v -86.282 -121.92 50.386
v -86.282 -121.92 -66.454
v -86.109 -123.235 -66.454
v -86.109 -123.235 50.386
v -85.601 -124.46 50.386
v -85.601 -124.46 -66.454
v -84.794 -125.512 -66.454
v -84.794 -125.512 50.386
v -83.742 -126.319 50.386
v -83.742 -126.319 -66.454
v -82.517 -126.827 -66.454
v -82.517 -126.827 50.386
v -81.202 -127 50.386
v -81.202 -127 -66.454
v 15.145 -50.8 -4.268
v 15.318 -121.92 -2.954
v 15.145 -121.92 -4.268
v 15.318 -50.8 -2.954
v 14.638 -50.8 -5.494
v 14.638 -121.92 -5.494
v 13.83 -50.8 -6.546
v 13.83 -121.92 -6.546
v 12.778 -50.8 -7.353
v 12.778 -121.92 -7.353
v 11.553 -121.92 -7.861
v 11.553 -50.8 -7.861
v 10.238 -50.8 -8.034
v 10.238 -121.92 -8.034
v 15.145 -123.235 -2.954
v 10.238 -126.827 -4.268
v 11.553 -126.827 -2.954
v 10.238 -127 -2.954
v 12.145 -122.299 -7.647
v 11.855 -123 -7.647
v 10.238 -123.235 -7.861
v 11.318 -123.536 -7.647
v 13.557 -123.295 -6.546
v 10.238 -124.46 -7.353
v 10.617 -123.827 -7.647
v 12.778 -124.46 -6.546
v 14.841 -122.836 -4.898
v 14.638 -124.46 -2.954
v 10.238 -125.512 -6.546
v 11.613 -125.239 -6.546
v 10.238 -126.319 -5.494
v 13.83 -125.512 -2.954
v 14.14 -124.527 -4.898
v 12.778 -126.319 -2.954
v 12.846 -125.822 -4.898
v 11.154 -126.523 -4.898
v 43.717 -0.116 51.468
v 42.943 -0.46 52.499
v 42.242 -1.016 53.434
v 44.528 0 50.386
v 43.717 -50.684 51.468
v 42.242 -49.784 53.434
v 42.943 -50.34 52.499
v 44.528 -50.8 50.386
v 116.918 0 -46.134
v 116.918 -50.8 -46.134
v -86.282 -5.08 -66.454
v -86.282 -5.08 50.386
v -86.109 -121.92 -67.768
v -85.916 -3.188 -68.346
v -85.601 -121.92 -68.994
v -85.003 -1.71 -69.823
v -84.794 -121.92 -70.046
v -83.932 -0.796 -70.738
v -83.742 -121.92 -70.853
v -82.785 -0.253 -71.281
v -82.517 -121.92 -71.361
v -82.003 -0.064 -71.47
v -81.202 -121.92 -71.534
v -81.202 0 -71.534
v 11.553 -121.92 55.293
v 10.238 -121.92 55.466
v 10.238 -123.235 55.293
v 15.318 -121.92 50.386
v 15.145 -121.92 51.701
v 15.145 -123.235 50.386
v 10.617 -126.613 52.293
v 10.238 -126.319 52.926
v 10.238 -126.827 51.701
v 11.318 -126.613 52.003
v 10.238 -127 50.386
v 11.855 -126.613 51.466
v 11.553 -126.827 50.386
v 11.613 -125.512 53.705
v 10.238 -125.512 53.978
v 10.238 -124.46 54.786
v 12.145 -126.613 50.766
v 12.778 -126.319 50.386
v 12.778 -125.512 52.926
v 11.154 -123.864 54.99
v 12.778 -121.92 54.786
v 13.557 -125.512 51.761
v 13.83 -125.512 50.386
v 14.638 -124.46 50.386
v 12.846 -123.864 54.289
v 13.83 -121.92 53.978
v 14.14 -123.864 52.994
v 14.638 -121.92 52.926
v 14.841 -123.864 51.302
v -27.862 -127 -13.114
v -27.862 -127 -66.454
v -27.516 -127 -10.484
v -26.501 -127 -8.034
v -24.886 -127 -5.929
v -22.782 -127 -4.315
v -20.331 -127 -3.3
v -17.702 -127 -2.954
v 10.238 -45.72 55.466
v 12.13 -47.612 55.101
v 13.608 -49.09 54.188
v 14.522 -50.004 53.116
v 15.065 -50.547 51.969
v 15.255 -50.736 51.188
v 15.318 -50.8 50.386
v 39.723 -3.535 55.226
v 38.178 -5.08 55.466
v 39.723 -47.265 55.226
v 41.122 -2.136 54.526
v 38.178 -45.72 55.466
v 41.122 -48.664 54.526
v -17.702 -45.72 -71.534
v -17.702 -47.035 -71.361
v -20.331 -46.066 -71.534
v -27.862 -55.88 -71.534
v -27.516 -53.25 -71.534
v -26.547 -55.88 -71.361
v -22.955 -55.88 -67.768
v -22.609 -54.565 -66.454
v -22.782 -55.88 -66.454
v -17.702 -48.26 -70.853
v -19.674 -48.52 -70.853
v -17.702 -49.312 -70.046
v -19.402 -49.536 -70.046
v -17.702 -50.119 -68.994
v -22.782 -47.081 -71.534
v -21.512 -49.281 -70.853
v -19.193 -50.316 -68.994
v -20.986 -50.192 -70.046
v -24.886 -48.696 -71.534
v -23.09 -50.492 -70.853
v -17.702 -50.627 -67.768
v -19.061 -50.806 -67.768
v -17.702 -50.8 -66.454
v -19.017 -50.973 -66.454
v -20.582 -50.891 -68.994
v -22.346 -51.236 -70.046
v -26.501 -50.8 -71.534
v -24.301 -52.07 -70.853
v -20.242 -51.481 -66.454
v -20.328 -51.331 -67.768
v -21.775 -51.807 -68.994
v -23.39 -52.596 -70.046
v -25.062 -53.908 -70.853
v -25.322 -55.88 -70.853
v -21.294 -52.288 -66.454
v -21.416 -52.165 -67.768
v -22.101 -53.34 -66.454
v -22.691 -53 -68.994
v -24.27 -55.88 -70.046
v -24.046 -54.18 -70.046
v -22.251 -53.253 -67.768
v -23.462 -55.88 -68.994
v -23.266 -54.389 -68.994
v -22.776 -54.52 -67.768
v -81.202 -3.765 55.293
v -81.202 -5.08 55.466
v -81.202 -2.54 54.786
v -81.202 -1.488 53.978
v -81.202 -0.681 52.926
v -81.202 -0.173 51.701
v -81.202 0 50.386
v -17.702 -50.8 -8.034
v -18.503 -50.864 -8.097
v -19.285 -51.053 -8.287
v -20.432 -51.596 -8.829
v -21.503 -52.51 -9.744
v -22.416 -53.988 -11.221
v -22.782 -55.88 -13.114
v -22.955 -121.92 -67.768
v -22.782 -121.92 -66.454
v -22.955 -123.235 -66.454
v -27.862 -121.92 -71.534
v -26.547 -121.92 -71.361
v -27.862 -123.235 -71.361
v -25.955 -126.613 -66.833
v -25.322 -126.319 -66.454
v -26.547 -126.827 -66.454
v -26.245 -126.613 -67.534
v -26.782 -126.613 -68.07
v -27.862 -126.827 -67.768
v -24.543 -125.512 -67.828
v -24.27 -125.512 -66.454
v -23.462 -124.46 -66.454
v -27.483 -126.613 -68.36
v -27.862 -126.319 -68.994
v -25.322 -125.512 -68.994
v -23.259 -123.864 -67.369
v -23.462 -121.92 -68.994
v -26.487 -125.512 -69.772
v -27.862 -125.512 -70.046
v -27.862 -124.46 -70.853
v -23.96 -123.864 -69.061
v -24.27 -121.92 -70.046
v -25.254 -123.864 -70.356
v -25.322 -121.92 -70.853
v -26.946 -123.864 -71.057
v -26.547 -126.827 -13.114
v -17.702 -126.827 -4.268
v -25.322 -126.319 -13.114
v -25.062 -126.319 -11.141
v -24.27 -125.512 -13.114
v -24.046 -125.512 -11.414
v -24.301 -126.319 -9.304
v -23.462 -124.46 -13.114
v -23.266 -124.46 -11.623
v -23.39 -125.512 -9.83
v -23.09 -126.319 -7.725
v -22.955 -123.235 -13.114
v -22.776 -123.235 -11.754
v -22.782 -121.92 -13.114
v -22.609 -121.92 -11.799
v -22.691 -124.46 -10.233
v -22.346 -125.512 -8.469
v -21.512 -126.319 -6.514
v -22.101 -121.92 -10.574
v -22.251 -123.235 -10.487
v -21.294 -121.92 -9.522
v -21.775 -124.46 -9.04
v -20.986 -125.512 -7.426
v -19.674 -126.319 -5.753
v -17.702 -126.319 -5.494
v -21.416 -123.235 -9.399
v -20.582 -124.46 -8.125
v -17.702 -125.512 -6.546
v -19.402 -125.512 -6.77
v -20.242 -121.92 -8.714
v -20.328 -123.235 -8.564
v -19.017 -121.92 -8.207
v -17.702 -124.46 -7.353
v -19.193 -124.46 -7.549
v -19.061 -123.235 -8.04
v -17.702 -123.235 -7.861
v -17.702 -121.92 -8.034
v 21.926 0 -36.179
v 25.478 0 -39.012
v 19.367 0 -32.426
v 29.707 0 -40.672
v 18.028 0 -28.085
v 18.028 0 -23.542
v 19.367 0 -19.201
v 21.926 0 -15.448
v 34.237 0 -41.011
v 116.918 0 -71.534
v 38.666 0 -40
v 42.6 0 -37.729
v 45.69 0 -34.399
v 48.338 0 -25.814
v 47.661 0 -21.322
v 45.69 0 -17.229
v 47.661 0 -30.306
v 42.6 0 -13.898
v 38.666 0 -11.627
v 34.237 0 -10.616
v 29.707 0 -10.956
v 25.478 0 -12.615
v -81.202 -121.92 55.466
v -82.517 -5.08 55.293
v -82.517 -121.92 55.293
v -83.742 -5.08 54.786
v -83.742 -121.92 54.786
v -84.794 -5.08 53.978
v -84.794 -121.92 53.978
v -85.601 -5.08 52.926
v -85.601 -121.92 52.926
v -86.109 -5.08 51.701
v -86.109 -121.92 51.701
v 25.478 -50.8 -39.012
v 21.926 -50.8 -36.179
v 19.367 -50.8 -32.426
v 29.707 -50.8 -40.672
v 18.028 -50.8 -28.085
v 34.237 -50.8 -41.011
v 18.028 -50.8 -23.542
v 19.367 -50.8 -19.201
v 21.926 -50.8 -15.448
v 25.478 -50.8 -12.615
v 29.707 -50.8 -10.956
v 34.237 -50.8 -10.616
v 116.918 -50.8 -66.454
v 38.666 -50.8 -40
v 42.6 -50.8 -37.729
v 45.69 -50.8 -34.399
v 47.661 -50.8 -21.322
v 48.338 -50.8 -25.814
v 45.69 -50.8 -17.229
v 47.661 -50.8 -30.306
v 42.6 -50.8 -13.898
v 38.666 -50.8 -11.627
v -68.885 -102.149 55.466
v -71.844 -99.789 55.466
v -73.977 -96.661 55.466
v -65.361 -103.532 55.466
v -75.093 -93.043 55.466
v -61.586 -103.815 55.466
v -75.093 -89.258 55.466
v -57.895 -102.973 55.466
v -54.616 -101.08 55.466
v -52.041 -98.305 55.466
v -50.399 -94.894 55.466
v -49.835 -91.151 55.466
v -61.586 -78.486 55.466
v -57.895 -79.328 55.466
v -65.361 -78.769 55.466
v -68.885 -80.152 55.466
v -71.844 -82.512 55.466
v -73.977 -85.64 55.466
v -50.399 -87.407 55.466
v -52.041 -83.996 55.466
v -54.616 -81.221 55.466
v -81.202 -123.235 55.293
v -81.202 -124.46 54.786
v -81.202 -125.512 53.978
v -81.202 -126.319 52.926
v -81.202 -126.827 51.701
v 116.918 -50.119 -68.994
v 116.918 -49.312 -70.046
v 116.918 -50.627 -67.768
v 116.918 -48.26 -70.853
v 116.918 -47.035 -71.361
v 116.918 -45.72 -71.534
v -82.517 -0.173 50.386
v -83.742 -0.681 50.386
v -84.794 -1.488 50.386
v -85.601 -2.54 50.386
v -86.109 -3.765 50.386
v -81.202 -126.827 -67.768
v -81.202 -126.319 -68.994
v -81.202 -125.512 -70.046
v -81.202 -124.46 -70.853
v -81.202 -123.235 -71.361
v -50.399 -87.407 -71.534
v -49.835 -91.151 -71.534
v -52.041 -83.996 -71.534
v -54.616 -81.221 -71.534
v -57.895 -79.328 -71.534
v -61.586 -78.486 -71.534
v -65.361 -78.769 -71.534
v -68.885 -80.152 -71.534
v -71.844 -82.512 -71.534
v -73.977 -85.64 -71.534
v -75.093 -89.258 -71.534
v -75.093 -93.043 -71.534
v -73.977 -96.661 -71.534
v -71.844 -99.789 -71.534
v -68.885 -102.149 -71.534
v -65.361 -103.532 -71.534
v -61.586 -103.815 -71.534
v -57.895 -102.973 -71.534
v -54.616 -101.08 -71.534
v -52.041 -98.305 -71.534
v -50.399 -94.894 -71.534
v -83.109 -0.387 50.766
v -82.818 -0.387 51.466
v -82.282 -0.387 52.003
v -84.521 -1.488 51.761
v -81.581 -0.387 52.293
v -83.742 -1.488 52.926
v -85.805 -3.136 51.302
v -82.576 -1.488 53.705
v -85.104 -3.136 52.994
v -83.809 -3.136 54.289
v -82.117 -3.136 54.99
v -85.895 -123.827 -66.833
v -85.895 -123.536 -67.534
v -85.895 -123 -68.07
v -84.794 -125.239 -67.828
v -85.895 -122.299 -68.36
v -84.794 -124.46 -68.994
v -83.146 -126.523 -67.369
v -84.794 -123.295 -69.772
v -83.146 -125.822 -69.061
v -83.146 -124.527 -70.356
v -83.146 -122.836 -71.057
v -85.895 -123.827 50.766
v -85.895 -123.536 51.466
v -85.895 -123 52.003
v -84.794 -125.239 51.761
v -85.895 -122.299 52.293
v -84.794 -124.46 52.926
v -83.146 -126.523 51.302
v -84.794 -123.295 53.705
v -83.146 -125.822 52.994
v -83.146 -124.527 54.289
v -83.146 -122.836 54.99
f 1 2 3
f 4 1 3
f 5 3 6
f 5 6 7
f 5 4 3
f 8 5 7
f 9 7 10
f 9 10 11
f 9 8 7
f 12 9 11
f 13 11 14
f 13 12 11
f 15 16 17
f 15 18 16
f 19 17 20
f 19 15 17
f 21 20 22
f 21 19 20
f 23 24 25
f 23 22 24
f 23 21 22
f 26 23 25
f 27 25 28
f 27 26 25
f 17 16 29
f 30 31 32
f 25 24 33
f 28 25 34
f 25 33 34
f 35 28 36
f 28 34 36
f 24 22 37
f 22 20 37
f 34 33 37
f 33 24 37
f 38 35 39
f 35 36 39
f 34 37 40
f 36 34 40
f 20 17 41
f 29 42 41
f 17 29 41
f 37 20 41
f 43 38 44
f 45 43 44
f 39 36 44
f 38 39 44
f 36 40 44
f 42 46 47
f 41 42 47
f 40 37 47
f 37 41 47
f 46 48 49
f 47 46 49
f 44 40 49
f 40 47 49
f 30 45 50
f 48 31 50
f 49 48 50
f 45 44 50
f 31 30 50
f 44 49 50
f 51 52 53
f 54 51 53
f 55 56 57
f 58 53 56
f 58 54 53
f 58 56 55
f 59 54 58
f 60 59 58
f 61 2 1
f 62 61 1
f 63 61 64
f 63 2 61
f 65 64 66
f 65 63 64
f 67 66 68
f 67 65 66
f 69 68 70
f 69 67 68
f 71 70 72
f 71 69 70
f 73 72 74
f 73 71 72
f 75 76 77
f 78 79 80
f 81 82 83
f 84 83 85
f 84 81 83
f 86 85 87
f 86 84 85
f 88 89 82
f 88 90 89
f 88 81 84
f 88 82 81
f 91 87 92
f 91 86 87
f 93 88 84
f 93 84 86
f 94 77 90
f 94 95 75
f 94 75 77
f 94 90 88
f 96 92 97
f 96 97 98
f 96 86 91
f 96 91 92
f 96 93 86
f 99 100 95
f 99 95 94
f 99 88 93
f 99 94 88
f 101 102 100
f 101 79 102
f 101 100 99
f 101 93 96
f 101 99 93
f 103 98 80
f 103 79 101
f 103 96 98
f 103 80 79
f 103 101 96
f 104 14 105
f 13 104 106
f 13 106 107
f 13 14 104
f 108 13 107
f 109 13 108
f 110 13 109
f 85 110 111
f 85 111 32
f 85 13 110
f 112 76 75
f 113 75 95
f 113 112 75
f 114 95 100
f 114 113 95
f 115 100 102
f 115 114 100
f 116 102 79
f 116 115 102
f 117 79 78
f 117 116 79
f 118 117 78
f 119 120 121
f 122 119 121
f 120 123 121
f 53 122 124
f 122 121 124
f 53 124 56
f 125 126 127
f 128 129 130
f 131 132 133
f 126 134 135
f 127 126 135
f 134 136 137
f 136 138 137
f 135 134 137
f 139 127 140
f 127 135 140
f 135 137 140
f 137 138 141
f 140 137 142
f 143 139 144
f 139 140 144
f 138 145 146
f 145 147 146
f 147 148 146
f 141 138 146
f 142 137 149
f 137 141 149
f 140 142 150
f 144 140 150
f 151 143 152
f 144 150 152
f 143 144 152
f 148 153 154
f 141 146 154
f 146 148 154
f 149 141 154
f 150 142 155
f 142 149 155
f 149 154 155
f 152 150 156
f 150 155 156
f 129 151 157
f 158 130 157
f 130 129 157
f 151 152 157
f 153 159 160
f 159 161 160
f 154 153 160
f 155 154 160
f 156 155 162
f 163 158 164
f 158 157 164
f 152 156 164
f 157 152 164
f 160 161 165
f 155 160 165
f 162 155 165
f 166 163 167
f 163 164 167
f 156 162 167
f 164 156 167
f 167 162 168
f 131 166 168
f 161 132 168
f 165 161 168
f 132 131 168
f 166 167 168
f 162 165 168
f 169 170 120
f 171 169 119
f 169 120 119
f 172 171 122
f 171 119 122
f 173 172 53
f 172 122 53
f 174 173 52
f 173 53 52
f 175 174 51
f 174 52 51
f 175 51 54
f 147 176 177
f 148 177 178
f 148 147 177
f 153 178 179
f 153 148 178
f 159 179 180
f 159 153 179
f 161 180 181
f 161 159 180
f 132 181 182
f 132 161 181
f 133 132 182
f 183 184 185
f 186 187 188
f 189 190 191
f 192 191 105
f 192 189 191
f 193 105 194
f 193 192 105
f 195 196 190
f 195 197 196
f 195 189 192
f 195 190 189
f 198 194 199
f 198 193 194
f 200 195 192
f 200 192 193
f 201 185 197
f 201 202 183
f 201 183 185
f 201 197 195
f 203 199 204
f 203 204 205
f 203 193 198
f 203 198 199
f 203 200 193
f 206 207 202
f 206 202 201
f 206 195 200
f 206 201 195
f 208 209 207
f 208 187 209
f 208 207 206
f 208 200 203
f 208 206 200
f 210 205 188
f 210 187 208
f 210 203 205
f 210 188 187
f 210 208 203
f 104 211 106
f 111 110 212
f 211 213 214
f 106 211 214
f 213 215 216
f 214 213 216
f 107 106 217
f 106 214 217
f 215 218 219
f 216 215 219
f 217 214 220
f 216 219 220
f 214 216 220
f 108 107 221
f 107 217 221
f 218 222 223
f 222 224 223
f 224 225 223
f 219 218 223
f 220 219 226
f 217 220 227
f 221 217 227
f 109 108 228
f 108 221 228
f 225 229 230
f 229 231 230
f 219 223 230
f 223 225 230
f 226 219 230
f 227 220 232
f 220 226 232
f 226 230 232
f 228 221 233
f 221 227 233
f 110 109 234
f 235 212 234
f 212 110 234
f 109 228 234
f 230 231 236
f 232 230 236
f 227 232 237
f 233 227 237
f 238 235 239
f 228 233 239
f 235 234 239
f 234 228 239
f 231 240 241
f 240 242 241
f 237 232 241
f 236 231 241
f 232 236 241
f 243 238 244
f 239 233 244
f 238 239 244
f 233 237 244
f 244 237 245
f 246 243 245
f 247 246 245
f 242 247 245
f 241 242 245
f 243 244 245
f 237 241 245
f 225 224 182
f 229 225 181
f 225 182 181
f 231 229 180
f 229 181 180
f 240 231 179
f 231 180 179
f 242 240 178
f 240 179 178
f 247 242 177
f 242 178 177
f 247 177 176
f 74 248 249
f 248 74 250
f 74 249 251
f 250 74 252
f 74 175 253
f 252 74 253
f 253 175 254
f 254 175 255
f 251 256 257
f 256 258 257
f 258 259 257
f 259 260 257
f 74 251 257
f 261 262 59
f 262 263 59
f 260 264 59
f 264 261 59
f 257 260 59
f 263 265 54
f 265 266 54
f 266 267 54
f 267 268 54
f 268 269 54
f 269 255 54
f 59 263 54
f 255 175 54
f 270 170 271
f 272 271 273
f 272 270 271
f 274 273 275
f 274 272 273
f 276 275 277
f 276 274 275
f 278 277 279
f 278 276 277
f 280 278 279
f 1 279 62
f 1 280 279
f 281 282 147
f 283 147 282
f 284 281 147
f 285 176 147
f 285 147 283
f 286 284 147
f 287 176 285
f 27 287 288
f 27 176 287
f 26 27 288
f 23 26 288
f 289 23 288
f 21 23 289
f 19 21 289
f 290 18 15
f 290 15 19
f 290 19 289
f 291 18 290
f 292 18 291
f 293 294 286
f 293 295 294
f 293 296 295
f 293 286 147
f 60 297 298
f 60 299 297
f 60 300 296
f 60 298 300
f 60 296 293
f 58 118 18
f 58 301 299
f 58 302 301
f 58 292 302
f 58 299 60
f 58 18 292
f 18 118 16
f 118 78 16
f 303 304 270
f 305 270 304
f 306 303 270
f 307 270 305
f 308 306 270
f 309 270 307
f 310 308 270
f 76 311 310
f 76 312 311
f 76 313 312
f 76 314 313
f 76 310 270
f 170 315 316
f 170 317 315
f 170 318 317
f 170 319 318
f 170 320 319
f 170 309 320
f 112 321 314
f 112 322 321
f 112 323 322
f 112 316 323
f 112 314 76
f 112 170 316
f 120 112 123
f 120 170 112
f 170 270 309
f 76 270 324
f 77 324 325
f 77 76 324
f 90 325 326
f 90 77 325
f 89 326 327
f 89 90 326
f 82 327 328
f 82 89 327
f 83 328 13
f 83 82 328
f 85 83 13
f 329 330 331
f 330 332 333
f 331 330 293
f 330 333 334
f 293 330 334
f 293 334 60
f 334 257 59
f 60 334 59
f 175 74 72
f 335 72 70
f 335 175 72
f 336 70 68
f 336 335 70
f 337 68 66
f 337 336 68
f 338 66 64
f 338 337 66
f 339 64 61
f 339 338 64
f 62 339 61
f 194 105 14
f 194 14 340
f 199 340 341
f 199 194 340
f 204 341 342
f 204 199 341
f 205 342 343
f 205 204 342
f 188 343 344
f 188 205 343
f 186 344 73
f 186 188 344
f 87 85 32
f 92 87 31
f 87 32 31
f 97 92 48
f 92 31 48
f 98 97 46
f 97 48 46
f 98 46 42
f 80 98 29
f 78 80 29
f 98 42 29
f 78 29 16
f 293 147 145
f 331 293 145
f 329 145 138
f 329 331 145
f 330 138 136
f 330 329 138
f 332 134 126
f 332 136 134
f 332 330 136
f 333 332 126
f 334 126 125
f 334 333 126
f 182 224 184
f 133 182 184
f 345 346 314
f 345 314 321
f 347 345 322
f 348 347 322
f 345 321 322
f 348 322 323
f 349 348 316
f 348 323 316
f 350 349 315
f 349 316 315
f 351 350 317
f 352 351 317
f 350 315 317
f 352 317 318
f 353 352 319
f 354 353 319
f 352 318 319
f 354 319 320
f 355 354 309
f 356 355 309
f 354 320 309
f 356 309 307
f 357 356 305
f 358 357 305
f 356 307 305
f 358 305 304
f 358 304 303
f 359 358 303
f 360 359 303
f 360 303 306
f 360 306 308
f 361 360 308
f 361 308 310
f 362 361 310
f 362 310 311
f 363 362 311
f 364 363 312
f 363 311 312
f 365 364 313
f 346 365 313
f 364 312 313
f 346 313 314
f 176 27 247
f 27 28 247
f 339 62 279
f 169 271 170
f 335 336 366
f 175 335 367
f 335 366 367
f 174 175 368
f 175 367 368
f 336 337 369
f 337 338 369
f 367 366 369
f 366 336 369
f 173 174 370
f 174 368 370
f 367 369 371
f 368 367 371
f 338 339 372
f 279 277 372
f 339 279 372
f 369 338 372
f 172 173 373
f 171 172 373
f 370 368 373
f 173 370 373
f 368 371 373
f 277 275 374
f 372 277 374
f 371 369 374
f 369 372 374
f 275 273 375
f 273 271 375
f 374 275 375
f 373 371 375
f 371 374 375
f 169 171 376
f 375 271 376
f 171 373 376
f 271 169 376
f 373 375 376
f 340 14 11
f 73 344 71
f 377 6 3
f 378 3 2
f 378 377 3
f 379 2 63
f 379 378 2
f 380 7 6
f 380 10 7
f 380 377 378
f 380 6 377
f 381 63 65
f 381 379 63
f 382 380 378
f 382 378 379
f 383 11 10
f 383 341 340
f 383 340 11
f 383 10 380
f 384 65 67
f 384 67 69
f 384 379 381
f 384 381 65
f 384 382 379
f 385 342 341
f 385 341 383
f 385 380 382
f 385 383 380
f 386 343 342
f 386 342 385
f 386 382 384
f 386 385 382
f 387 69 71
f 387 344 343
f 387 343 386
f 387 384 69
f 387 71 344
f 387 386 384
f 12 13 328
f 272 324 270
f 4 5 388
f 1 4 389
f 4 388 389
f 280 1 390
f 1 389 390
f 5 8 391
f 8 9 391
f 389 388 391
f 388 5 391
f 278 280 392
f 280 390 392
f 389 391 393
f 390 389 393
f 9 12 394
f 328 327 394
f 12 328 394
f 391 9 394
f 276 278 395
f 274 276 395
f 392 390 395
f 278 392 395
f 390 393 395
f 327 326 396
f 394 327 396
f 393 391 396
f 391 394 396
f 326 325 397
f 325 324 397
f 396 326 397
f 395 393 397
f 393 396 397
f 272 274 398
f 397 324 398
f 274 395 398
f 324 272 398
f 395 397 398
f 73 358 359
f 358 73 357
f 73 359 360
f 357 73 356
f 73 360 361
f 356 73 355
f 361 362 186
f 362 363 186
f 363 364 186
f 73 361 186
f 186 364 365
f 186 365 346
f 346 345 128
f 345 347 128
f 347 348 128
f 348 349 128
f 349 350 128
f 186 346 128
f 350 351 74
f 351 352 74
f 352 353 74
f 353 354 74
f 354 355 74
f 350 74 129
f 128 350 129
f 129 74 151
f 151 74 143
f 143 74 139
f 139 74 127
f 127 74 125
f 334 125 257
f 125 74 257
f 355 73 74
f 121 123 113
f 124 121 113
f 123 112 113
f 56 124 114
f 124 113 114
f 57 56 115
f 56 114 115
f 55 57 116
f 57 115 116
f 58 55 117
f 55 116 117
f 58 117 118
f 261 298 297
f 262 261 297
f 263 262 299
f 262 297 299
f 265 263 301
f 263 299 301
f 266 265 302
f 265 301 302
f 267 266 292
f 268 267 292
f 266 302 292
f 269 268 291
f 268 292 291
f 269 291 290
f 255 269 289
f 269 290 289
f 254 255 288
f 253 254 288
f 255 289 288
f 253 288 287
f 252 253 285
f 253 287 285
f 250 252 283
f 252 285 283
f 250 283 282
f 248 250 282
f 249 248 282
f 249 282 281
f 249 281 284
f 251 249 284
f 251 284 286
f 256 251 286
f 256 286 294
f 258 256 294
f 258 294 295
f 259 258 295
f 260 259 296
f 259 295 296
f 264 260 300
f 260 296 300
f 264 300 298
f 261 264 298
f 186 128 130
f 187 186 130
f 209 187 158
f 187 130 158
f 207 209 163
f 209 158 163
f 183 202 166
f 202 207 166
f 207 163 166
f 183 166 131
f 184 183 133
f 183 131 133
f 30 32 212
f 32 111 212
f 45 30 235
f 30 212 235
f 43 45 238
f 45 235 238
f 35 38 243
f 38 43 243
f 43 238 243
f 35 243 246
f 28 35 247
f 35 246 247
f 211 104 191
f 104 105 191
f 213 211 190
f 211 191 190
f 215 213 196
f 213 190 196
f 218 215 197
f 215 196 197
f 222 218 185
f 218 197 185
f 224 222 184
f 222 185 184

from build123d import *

# Parameters (mm, degrees)
F0_W     = 203.2
F0_H     = 127
F1_DEPTH = 127
F3_DEPTH = 76.2
F4_SIZE2 = 101.6
F4_SIZE  = 76.2
F5_R     = 5.08
F6_R     = 15.24
F7_DEPTH = 50.8
F8_R     = 12.7
F9_DEPTH = 127


with BuildPart() as f1:
    # F0 (on Front) → F1 (new body)
    with BuildSketch(Plane.XZ):
        with Locations((15.3181515634, -8.0336100439)):
            Rectangle(F0_W, F0_H)
    extrude(amount=F1_DEPTH)

    # F2 (on face) → F3 (cut)
    with BuildSketch(Plane.XZ.offset(127)):
        Polygon((-22.7818484366, -8.0336100439), (-22.7818484366, -71.5336100439), (116.9181515634, -71.5336100439), (116.9181515634, 55.4663899561), (15.3181515634, 55.4663899561), (15.3181515634, 37.2199955379), (15.3181515634, -8.0336100439), align=None)
    extrude(amount=-F3_DEPTH, mode=Mode.SUBTRACT)

    # F4
    f4_edges = [f1.edges().sort_by_distance(p)[0] for p in [
        (116.918152, -25.4, 55.46639),
    ]]
    f4_side = f1.faces().sort_by_distance((-6.453277, -52.614286, 55.46639))[0]
    chamfer(f4_edges, length=F4_SIZE, length2=F4_SIZE2, reference=f4_side)

    # F5
    f5_edges = [f1.edges().sort_by_distance(p)[0] for p in [
        (15.318152, -88.9, 55.46639),
        (-35.481848, -127, 55.46639),
        (15.318152, -127, 23.71639),
        (15.318152, -88.9, -8.03361),
        (-22.781848, -88.9, -8.03361),
        (-22.781848, -88.9, -71.53361),
        (-22.781848, -127, -39.78361),
        (-22.781848, -50.8, -39.78361),
        (-3.731848, -127, -8.03361),
        (-54.531848, -127, -71.53361),
        (-86.281848, -127, -8.03361),
        (-86.281848, -63.5, 55.46639),
        (-86.281848, -63.5, -71.53361),
        (-86.281848, 0, -8.03361),
        (-22.781848, 0, 55.46639),
        (40.718152, -25.4, 55.46639),
        (28.018152, -50.8, 55.46639),
        (47.068152, -50.8, -71.53361),
    ]]
    fillet(f5_edges, radius=F5_R)

    # F6 (on face) → F7 (cut, through all)
    with BuildSketch(Plane.XZ.offset(50.8)):
        with Locations((33.0981515634, -25.8136100439)):
            Circle(F6_R)
    extrude(amount=-F7_DEPTH, mode=Mode.SUBTRACT)

    # F8 (on face) → F9 (cut, through all)
    with BuildSketch(Plane.XY.offset(55.4663899561)):
        with Locations((-62.5347197056, -91.1505147815)):
            Circle(F8_R)
    extrude(amount=-F9_DEPTH, mode=Mode.SUBTRACT)


solid = f1.part
